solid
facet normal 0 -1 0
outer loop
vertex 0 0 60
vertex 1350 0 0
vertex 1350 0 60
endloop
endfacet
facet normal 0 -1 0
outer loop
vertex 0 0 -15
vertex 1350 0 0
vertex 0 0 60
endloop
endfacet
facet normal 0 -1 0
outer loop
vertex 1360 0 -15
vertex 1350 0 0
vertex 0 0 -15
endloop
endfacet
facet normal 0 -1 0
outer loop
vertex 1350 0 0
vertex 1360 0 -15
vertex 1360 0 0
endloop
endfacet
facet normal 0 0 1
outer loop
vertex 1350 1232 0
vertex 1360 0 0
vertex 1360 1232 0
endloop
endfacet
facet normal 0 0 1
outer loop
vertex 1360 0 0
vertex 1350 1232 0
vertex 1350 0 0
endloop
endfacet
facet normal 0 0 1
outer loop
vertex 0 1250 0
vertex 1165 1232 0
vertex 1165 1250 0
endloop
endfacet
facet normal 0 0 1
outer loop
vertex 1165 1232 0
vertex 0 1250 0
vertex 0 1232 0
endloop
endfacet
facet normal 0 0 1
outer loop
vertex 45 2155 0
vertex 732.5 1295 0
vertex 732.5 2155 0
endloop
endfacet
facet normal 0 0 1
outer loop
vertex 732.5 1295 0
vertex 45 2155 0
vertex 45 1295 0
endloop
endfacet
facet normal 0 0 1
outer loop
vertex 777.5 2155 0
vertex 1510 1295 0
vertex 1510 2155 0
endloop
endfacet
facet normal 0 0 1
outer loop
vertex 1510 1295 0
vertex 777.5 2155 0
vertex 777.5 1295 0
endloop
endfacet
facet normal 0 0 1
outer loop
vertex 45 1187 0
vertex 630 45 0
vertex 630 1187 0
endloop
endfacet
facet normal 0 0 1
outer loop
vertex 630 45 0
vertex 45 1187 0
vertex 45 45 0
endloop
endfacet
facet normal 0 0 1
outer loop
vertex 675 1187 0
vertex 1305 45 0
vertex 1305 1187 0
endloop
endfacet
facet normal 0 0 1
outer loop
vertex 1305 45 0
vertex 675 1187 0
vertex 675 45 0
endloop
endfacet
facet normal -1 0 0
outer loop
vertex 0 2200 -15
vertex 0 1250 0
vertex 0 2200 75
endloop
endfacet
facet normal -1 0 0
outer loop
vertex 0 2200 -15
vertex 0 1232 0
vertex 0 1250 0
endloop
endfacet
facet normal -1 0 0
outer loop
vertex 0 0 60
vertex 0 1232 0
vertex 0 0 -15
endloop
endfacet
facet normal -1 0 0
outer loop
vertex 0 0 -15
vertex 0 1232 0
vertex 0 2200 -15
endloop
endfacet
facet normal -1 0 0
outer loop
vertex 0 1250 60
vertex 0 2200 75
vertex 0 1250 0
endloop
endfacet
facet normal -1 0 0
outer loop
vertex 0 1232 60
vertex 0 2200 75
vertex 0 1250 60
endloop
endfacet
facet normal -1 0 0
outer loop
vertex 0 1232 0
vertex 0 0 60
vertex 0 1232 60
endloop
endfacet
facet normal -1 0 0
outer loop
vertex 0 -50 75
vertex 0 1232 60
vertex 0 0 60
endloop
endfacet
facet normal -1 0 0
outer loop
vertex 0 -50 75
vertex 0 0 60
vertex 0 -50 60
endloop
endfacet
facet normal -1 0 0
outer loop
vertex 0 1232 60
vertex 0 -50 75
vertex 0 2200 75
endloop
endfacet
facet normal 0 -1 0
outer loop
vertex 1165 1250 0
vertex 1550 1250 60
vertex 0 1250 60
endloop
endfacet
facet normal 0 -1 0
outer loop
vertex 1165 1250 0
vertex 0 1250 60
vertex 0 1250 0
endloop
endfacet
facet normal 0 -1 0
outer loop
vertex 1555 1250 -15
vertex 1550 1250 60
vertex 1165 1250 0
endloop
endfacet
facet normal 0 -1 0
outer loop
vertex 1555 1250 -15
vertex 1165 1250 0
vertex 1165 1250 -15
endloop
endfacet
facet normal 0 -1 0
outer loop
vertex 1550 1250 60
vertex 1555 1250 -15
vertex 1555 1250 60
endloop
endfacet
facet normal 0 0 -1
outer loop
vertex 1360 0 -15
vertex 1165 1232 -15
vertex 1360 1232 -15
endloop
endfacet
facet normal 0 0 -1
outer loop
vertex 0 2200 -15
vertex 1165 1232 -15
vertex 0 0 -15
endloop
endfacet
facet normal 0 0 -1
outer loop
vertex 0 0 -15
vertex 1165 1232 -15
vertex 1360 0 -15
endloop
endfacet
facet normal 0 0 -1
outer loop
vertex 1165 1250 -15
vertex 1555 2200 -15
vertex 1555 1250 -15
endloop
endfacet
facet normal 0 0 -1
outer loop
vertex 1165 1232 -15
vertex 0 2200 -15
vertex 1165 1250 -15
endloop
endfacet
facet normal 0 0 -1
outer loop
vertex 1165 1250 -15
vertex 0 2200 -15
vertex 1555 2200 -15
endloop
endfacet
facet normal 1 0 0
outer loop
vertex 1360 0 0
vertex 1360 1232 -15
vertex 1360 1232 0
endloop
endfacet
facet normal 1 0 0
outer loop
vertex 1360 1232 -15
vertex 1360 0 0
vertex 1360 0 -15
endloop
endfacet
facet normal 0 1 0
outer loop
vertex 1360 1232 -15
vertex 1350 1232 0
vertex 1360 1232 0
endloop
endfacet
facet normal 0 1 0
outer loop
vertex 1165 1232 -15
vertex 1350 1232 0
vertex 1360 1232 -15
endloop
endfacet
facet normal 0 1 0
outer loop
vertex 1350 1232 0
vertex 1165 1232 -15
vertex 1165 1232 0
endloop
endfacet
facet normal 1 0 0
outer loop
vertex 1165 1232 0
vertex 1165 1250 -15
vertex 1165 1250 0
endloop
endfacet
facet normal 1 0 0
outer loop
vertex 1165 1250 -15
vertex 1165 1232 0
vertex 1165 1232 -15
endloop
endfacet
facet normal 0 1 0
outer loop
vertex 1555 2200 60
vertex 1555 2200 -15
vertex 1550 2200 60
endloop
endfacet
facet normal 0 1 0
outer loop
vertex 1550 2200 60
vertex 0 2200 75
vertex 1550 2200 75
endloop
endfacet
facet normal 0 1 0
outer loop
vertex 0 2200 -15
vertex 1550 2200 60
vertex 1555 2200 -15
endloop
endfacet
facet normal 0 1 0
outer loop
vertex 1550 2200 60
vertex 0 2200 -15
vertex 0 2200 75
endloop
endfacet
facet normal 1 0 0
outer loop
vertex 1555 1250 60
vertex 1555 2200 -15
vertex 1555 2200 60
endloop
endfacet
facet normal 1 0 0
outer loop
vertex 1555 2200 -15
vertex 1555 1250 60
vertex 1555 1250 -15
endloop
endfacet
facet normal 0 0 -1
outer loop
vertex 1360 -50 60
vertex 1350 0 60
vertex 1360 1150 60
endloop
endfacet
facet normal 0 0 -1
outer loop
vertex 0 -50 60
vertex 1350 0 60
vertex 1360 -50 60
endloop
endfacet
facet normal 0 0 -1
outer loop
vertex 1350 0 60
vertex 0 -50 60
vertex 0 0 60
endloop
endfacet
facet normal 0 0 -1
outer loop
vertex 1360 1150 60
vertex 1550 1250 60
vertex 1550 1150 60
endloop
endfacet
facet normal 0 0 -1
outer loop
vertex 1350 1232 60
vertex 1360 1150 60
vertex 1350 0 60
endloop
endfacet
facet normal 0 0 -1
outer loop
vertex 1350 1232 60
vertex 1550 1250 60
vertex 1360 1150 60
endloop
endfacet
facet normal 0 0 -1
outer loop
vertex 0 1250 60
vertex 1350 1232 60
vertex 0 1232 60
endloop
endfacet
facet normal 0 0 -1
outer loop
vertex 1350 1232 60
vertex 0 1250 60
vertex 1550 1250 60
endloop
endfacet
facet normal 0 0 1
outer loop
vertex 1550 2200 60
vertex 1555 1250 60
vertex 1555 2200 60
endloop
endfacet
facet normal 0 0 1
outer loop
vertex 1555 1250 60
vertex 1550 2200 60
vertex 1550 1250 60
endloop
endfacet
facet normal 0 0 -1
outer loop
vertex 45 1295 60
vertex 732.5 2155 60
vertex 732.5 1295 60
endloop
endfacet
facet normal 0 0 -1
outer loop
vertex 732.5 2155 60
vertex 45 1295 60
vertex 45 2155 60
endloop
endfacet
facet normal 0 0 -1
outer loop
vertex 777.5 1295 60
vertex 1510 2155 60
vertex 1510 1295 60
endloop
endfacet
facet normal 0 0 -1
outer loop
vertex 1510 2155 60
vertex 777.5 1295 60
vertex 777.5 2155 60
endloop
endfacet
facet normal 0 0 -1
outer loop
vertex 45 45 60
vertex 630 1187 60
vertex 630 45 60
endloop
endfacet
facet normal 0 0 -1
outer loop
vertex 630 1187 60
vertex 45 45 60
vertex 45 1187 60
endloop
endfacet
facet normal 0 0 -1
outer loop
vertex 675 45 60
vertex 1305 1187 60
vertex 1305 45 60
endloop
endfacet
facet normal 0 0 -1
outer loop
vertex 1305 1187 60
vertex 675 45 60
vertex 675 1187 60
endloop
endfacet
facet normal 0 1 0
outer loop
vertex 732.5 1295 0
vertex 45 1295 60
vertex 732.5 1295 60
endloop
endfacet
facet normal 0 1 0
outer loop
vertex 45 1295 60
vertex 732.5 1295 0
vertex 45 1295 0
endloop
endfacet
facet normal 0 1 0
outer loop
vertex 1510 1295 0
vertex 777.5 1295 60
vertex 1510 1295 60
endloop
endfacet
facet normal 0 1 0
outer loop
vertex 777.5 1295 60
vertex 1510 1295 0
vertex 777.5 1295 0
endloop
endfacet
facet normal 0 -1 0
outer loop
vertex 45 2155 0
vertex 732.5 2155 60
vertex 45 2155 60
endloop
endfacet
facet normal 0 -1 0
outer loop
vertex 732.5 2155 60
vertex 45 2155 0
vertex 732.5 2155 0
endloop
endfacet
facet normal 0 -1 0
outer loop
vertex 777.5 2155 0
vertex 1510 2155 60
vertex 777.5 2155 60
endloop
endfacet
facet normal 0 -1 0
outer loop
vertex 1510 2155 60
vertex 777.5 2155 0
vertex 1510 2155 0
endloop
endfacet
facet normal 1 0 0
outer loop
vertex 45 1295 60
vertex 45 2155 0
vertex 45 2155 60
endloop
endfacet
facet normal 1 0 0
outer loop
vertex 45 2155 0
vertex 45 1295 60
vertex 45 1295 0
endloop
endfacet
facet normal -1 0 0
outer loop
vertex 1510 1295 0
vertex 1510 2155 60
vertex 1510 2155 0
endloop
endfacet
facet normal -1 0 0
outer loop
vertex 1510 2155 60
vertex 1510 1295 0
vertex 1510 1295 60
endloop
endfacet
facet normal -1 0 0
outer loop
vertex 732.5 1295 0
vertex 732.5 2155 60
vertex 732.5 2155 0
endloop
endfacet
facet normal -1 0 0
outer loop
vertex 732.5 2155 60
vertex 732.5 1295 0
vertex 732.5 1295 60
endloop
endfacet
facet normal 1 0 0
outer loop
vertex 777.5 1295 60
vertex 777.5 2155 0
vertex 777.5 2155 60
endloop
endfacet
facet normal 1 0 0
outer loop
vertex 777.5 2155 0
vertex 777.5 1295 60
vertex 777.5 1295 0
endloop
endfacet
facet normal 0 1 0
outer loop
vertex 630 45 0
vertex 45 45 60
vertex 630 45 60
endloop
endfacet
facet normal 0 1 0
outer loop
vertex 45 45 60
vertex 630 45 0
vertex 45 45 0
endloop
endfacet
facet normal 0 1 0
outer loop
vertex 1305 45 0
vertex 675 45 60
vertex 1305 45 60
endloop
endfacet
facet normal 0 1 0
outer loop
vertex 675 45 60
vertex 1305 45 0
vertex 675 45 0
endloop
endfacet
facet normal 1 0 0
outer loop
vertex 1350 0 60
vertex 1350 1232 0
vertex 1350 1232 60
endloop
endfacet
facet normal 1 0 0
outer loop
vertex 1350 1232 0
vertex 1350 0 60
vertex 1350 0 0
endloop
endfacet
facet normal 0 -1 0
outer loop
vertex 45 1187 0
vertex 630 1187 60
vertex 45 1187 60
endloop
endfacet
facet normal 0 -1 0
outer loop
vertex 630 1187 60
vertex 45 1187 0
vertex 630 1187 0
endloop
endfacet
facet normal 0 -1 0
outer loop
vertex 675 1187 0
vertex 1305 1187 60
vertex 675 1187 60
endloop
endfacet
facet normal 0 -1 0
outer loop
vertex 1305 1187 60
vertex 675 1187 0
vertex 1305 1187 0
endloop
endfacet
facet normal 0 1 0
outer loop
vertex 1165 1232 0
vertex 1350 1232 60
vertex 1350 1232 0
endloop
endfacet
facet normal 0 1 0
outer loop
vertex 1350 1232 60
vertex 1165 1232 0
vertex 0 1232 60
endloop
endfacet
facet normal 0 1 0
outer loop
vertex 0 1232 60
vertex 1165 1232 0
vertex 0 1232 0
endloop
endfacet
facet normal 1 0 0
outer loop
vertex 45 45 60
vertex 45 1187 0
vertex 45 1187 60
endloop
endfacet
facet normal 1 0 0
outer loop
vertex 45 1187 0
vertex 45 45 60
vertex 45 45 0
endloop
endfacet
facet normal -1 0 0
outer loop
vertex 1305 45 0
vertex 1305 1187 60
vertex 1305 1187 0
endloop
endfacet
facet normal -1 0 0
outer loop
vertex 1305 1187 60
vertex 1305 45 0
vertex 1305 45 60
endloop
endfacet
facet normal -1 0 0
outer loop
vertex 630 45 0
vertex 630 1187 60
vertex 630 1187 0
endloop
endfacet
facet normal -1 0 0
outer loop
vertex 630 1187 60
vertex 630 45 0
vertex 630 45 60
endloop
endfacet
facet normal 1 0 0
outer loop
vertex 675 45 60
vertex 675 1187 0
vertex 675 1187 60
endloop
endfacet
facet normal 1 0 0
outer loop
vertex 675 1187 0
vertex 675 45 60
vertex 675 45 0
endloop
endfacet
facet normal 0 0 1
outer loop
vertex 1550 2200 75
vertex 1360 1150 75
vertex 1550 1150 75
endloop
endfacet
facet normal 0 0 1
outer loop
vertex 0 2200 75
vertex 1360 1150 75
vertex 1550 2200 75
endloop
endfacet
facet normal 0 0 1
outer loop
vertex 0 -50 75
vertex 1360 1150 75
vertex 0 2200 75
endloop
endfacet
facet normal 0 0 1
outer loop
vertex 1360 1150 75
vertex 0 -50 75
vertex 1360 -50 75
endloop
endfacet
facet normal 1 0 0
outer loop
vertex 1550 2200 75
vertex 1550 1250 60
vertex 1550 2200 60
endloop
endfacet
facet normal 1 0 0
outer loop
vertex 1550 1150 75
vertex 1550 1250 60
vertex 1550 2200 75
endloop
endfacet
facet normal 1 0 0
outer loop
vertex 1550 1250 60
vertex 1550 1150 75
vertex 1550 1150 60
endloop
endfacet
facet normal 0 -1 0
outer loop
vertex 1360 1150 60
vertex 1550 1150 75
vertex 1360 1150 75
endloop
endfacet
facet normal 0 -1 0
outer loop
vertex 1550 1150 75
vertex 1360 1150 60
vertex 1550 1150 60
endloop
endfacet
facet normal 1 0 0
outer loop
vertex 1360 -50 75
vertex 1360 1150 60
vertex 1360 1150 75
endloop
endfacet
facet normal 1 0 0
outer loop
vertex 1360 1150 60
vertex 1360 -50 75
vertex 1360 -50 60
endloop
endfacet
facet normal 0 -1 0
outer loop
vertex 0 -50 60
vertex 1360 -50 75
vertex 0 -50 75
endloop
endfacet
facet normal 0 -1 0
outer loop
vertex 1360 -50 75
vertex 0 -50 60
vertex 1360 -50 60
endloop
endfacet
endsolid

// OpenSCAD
// file: ../common/library_function.scad
// 라이브러리, 검증된 것만 이곳에
use <MCAD/boxes.scad>
include	<constants.scad>

// 적정한 fn 값
function fnRound(radious) = $preview ? FN : floor(2 * PI * radious / 0.4) - floor(2 * PI * radious / 0.4) % 4;
//function fnRound(radious) = 2 * PI * radious / 0.4;

// z축 0로로
function set_z(v, z) = [v.x, v.y, z];

// 벡터 회전 계산
function rotate_vector(angle, vector) = rotatez_vector(angle[2], rotatey_vector(angle[1], rotatex_vector(angle[0], vector)));
// x축 기준 회전 벡터 회전 계산
function rotatex_vector(anglex, vector) = [
	vector[0],
	-vector[2] * sin(anglex) + vector[1] * cos(anglex),
	vector[2] * cos(anglex) + vector[1] * sin(anglex)
];
// y축 기준 회전 벡터 회전 계산
function rotatey_vector(angley, vector) = [
	vector[0] * cos(angley) + vector[2] * sin(angley),
	vector[1],
	-vector[0] * sin(angley) + vector[2] * cos(angley)
];

// z축 기준 회전 벡터 회전 계산
function rotatez_vector(anglez, vector) = [
	-vector[1] * sin(anglez) + vector[0] * cos(anglez),
	vector[1] * cos(anglez) + vector[0] * sin(anglez),
	vector[2]
];

//	숫자, 소수점 이하 몇자리
function strfix(number, count) =
	chr([for (cx = [0:
		len(search(".", str(number))) == 0
			? len(str(number)) - 1
			: (search(".", str(number))[0] + count) >= len(str(number))
				? len(str(number)) - 1
				: (search(".", str(number))[0] + count)
	]) ord(str(number)[cx])])
;

//	육면체에서 꼭지점들을 벡터로
function	vectors_from_cube(size) = [
	[0,			0,		0],
	[size.x,	0,		0],
	[size.x,	size.y,	0],
	[0,			size.y,	0],

	[0,			0,		size.z],
	[size.x,	0,		size.z],
	[size.x,	size.y,	size.z],
	[0,			size.y,	size.z]
];
// file: ../common/library_line.scad
// 라이브러리, 검증된 것만 이곳에
include	<constants.scad>

module line_type_1(start, end, r1, r2) {
	r22 = is_undef(r2) ? r1 : r2;
    hull() {
        translate(start) sphere(r1, $fn = FN);
        translate(end) sphere(r22, $fn = FN);
    }

	dx = end.x - start.x;
	dy = end.y - start.y;
	dz = end.z - start.z;
	rx = dy == 0 ? 0 : atan(dz / dy);
	ry = dz == 0 ? 0 : 90 + atan(dx / dz);
	rz = dx == 0 ? 0 : atan(dy / dx);
	d = sqrt(dx * dx + dy * dy + dz * dz);
	fs = max(0.5, min(d / 32, 20));
	translate([(start.x + end.x) / 2 + max(r1, r22), (start.y + end.y) / 2 + max(r1, r22), (start.z + end.z) / 2 + max(r1, r22)])
		rotate([rx, ry, rz])
		linear_extrude(EPSILON, center = true)	text(str(d, " mm"), size = fs, halign = "center", language = "kr", font = "NanumGothic");
}
// file: ../common/library_cube.scad
// 라이브러리, 검증된 것만 이곳에
include	<constants.scad>
use <library_text.scad>
use <library_line.scad>

//	튜브형태의 네모 박스, 사방 벽면만 있는 형태
//	size: 외경
module box_type_1(size, thick) {
	cube([size[0], thick, size[2]]);	//	앞
	translate([0, size[1] - thick, 0])	cube([size[0], thick, size[2]]);	//	뒤

	translate([0, 0, 0])	cube([thick, size[1], size[2]]);	//	왼쪽
	translate([size[0] - thick, 0, 0])	cube([thick, size[1], size[2]]);	//	오른쪽
}

// 끝에 반구가 더달린 실린더형태의 3차원 라인
// 대칭 사다리꼴, xz 평면에서 보았을 때
module cube_type_1(v, x) {
	rotate([0, -90, -90])
	linear_extrude(v.y)
	polygon([
		[0,		0],
		[0,		v.x],
		[v.z,	v.x - (v.x - x) / 2],
		[v.z,	(v.x - x) / 2],
		[0,		0]
	]);
}

// 한쪽으로만(x축 방향으로만) 늘어나는(또는 줄어드는) 사다리꼴-하나는 직각 유지, xz 평면에서 보았을 때
module cube_type_2(v, x) {
	rotate([0, -90, -90])
	linear_extrude(v.y)
	polygon([
		[0,		0],
		[0,		v.x],
		[v.z,	x],
		[v.z,	0],
		[0,		0]
	]);
}

// 벡터들을 이용하여 꼭지점을 직각으로만 연결하는 육면체
module cube_type_3(vectors, radious) {
	// 아래쪽
	line_type_1(vectors[0], vectors[1], radious);
	line_type_1(vectors[1], vectors[2], radious);
	line_type_1(vectors[2], vectors[3], radious);
	line_type_1(vectors[3], vectors[0], radious);

	// 위쪽
	line_type_1(vectors[4], vectors[5], radious);
	line_type_1(vectors[5], vectors[6], radious);
	line_type_1(vectors[6], vectors[7], radious);
	line_type_1(vectors[7], vectors[4], radious);
	
	// 기둥
	line_type_1(vectors[0], vectors[4], radious);
	line_type_1(vectors[1], vectors[5], radious);
	line_type_1(vectors[2], vectors[6], radious);
	line_type_1(vectors[3], vectors[7], radious);
}

// x 축으로의 모서리의 일부 각을 제거한 것
module cube_type_4(v, c) {
	r = is_undef(c) ? min(v.y, v.z) / 16 : c;
	stiffen = r * sqrt(2);

	translate([0, r, 0])		cube(v - [0, r * 2, 0]);
	translate([0, 0, r])		cube(v - [0, 0, r * 2]);
	translate([0, r, 0])				rotate([45, 0, 0])	cube([v.x, r, r]);
	translate([0, r, v.z - r * 2])		rotate([45, 0, 0])	cube([v.x, stiffen, stiffen]);
	translate([0, v.y - r, v.z - r * 2])		rotate([45, 0, 0])	cube([v.x, stiffen, stiffen]);
	translate([0, v.y - r, 0])		rotate([45, 0, 0])	cube([v.x, stiffen, stiffen]);
}

// xy평면에 격자 모형, 45도
module cube_type_5(size, wall) {
	intersection() {
		cube(size);
		for(cx = [0: wall * 4: size.x + size.y]) {
			translate([cx, - wall * sqrt(2), 0])	rotate([0, 0, 45])	cube([wall, size.y * 2, size.z]);
			translate([cx - size.y, - wall * sqrt(2), 0])	rotate([0, 0, -45])	cube([wall, size.y * 2, size.z]);
		}
	}
}

module cube_types() {
	//	cube_type_1
	color("white", 1.0)	cube_type_1([16, 32, 4], 12);
	note_type_1([16, 32, 4], [12, 32, 4]);
	translate([4, 24, 4])	text("cube_type_1", size = 1);
	translate([4, 22, 4])	text("[16, 32, 4], 12", size = 1);
	translate([4, 20, 4])	text("note_type_1", size = 1);
	x1 = 16 + 4;
	
	//	cube_type_2
	translate([x1, 0, 0]) {
		color("yellow", 1.0)	cube_type_2([16, 32, 4], 20);
		note_type_1([16, 32, 4], [12, 32, 4]);
		translate([4, 24, 4])	text("cube_type_2", size = 1);
		translate([4, 22, 4])	text("[16, 32, 4], 20", size = 1);
	}
	x2 = x1 + 16 + 4;

	//	box_type_1: 튜브형태의 네모 박스, 사방 벽면만 있는 형태
	translate([x2, 8, 0])
	{
		color("blue", 0.5)	box_type_1([8, 16, 32], 2);
		color("white", 0.5)	note_type_1([8, 16, 32]);
		translate([-4, -2, 0])	text("box_type_1([8, 16, 32], 2)", size = 1);
	}
	x5 = x2 + 24;

	// cube_type_3: 벡터들을 이용하여 꼭지점을 직각으로만 연결하는 육면체
	translate([x5, 8, 8])
	{
		x = 4;
		y = 8;
		z = 16;
		r = 1;
		v = [
			[0, 0, 0],
			[x, 0, 0],
			[x, y, 0],
			[0, y, 0],
			[0, 0, z],
			[x, 0, z],
			[x, y, z],
			[0, y, z]
		];
		cube_type_3(v, r);
		color("white", 1.0)	
		translate([-r, -r, -r])	note_type_1([x, y, z] + [r * 2, r * 2, r * 2]);
		translate([0, -4, 0])	text("cube_type_3(v, 1)", size = 1);
	}
	x7 = x5 + 16;

	//	cube_type_1
	translate([x7, 64, 0])
	{
		color("white", 1.0)	cube_type_1([16, 32, 4], 12);
		//	module note_type_2(name, vs, ve, centered = false, fs, detail = false) {
		note_type_2("note_type_2", [16, 32, 4], [12, 32, 4], false, undef, true);
	}
	x12 = x7 + 16 + 4;

	//	cube_type_4
	translate([x12, 64, 0])
	{
		cube_type_4([16, 4, 8]);
		note_type_2("cube_type_4([16, 4, 8])", [16, 4, 8]);
	}
	x14 = x12 + 24;

	//	cube_type_5
	translate([x14, 64, 0])
	{
		cube_type_5([32, 64, 2], 2);
		note_type_2("cube_type_5([32, 64, 2], 2)", [32, 64, 2]);
	}
	x15 = x14 + 24;

}
cube_types();
// file: ../common/constants.scad
// 상수들 정의
// include 사용하시오
ZERO = [0, 0, 0];
HALF = [1/2, 1/2, 1/2];
ONE = [1, 1, 1];
BIG = [1024, 1024, 1024];
EPSILON = 0.01;
EPSILON2 = EPSILON * 2;
MINIMUM = 0.1;	//	0.1mm

FN = $preview ? 16 : 360;

//	자원들
RADIUS_HOLE_NUT_25 = 3.4 / 2;	//	검은색 25mm 나사 너트 구멍 반지름
// main file
use <MCAD/boxes.scad>

include	<../common/constants.scad>
use <../common/library.scad>
use <../common/library_cube.scad>

// 상수
BAR = [45, 60];

module one(x, y, z) {
    cube_type_2([x, y, z], x);
}
module onev(v) {
    cube_type_2(v, v.x);
}
module deck1(y) {
    translate([0, y, 0])
    one(1550, 150, 15);
}
module deck2(y) {
    translate([0, y, 0])
    one(1360, 150, 15);
}

module bar(x, y) {
    width = BAR.x;
    height = BAR.y;
    one(x, width, height);
    translate([0, y - width, 0])    one(x, width, height);

    translate([0, width, 0])    one(width, y - 2 * width, height);
    translate([x - width, width, 0])    one(width, y - 2 * width, height);
    translate([x / 2 - width, width, 0])    one(width, y - 2 * width, height);
}

module build(target, step) {
    color1 = [0.5, 0.5, 1.0, 0.5];
    color2 = [0.8, 0.8, 1.0, 0.5];
    color3 = [0.5, 0.2, 0.5, 0.8];
    v1 = [1555, 950, 15];
    v2 = [1360, 2200 - v1.y, v1.z];
    v3 = [v1.x - v2.x + 1, 18, v1.z + 2];

    translate([0, 0, -15]) {
        translate([0, v2.y, 0])
        onev(v1);
        difference() {
            onev(v2);
            translate([v2.x - v3.x + 1, v2.y - v3.y, -1])
            onev(v3);
        }
    }
    color(color3) {
        translate([0, v2.y, 0]) {
            bar(1555, 950);
        }
        bar(1350, 1250 - 18);
    }
    translate([0, 0, BAR.y]) {
        y = 2200 - 150;
        color(color2)        deck1(y - 150 * 0);
        color(color1)        deck1(y - 150 * 1);
        color(color2)        deck1(y - 150 * 2);
        color(color1)        deck1(y - 150 * 3);
        color(color2)        deck1(y - 150 * 4);
        color(color1)        deck1(y - 150 * 5);
        color(color2)        deck1(y - 150 * 6);
        color(color1)        deck2(y - 150 * 7);
        color(color2)        deck2(y - 150 * 8);
        color(color1)        deck2(y - 150 * 9);
        color(color2)        deck2(y - 150 * 10);
        color(color1)        deck2(y - 150 * 11);
        color(color2)        deck2(y - 150 * 12);
        color(color1)        deck2(y - 150 * 13);
        color(color2)        deck2(y - 150 * 14);
    }
}

target = 7;
build(target, $t);
